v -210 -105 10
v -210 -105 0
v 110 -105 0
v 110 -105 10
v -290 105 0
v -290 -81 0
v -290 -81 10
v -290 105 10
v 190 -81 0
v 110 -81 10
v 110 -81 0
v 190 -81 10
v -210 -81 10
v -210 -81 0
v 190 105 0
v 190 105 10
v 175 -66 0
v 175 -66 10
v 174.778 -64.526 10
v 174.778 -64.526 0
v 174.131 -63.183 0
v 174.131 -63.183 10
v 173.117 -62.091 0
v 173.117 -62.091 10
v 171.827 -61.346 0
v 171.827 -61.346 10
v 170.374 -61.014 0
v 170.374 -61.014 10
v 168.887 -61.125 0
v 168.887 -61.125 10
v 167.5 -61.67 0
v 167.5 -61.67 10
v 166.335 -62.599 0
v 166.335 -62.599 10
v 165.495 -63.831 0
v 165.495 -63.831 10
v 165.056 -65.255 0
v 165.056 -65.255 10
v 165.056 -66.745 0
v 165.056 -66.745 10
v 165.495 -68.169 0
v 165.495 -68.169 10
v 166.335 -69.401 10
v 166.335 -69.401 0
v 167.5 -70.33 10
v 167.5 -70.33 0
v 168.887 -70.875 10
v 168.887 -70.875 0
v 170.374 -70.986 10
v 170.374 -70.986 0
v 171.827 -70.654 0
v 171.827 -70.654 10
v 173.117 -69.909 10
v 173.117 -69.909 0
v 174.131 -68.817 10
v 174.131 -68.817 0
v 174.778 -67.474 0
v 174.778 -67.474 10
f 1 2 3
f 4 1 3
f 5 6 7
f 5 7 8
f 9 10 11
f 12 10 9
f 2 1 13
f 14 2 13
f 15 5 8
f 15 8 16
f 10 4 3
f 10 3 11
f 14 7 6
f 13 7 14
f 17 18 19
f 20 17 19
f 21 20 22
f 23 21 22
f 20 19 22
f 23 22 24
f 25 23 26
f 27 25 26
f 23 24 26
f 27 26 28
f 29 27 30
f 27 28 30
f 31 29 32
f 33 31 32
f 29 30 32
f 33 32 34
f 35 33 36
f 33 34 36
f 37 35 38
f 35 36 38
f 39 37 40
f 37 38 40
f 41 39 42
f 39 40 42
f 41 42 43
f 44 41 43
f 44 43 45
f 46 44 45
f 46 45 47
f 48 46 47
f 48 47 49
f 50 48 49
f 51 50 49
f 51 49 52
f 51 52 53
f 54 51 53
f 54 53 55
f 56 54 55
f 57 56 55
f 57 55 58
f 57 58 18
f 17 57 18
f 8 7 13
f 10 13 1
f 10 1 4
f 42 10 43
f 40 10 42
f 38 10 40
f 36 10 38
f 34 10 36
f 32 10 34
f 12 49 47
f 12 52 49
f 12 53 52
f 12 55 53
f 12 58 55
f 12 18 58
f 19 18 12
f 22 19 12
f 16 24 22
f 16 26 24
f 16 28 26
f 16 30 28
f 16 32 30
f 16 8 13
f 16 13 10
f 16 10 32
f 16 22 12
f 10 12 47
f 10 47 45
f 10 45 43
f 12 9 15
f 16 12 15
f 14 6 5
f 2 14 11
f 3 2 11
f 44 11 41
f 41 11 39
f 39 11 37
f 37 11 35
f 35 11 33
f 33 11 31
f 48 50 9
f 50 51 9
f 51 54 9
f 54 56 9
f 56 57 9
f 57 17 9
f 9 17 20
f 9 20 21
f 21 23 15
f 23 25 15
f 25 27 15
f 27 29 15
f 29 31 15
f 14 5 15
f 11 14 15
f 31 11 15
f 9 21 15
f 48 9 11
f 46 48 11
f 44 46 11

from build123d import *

# Parameters (mm, degrees)
ESQUISSE1_W             = 480
ESQUISSE1_H             = 210
BOSS_EXTRU_1_DEPTH      = 10
ESQUISSE2_W             = 80
ESQUISSE2_H             = 24
ENL_V_MAT_EXTRU_1_DEPTH = 11
ESQUISSE3_R             = 5
ENL_V_MAT_EXTRU_2_DEPTH = 11


with BuildPart() as part:
    # Esquisse1 → Boss.-Extru.1 (new body)
    with BuildSketch(Plane.XY):
        with Locations((-50, 0)):
            Rectangle(ESQUISSE1_W, ESQUISSE1_H)
    extrude(amount=BOSS_EXTRU_1_DEPTH)

    # Esquisse2 → Enlèv. mat.-Extru.1 (cut, through all)
    with BuildSketch(Plane.XY.offset(10)):
        with Locations((150, -93)):
            Rectangle(ESQUISSE2_W, ESQUISSE2_H)
        with Locations((-250, -93)):
            Rectangle(ESQUISSE2_W, ESQUISSE2_H)
    extrude(amount=-ENL_V_MAT_EXTRU_1_DEPTH, mode=Mode.SUBTRACT)

    # Esquisse3 → Enlèv. mat.-Extru.2 (cut, through all)
    with BuildSketch(Plane.XY.offset(10)):
        with Locations((170, -66)):
            Circle(ESQUISSE3_R)
    extrude(amount=-ENL_V_MAT_EXTRU_2_DEPTH, mode=Mode.SUBTRACT)


solid = part.part
